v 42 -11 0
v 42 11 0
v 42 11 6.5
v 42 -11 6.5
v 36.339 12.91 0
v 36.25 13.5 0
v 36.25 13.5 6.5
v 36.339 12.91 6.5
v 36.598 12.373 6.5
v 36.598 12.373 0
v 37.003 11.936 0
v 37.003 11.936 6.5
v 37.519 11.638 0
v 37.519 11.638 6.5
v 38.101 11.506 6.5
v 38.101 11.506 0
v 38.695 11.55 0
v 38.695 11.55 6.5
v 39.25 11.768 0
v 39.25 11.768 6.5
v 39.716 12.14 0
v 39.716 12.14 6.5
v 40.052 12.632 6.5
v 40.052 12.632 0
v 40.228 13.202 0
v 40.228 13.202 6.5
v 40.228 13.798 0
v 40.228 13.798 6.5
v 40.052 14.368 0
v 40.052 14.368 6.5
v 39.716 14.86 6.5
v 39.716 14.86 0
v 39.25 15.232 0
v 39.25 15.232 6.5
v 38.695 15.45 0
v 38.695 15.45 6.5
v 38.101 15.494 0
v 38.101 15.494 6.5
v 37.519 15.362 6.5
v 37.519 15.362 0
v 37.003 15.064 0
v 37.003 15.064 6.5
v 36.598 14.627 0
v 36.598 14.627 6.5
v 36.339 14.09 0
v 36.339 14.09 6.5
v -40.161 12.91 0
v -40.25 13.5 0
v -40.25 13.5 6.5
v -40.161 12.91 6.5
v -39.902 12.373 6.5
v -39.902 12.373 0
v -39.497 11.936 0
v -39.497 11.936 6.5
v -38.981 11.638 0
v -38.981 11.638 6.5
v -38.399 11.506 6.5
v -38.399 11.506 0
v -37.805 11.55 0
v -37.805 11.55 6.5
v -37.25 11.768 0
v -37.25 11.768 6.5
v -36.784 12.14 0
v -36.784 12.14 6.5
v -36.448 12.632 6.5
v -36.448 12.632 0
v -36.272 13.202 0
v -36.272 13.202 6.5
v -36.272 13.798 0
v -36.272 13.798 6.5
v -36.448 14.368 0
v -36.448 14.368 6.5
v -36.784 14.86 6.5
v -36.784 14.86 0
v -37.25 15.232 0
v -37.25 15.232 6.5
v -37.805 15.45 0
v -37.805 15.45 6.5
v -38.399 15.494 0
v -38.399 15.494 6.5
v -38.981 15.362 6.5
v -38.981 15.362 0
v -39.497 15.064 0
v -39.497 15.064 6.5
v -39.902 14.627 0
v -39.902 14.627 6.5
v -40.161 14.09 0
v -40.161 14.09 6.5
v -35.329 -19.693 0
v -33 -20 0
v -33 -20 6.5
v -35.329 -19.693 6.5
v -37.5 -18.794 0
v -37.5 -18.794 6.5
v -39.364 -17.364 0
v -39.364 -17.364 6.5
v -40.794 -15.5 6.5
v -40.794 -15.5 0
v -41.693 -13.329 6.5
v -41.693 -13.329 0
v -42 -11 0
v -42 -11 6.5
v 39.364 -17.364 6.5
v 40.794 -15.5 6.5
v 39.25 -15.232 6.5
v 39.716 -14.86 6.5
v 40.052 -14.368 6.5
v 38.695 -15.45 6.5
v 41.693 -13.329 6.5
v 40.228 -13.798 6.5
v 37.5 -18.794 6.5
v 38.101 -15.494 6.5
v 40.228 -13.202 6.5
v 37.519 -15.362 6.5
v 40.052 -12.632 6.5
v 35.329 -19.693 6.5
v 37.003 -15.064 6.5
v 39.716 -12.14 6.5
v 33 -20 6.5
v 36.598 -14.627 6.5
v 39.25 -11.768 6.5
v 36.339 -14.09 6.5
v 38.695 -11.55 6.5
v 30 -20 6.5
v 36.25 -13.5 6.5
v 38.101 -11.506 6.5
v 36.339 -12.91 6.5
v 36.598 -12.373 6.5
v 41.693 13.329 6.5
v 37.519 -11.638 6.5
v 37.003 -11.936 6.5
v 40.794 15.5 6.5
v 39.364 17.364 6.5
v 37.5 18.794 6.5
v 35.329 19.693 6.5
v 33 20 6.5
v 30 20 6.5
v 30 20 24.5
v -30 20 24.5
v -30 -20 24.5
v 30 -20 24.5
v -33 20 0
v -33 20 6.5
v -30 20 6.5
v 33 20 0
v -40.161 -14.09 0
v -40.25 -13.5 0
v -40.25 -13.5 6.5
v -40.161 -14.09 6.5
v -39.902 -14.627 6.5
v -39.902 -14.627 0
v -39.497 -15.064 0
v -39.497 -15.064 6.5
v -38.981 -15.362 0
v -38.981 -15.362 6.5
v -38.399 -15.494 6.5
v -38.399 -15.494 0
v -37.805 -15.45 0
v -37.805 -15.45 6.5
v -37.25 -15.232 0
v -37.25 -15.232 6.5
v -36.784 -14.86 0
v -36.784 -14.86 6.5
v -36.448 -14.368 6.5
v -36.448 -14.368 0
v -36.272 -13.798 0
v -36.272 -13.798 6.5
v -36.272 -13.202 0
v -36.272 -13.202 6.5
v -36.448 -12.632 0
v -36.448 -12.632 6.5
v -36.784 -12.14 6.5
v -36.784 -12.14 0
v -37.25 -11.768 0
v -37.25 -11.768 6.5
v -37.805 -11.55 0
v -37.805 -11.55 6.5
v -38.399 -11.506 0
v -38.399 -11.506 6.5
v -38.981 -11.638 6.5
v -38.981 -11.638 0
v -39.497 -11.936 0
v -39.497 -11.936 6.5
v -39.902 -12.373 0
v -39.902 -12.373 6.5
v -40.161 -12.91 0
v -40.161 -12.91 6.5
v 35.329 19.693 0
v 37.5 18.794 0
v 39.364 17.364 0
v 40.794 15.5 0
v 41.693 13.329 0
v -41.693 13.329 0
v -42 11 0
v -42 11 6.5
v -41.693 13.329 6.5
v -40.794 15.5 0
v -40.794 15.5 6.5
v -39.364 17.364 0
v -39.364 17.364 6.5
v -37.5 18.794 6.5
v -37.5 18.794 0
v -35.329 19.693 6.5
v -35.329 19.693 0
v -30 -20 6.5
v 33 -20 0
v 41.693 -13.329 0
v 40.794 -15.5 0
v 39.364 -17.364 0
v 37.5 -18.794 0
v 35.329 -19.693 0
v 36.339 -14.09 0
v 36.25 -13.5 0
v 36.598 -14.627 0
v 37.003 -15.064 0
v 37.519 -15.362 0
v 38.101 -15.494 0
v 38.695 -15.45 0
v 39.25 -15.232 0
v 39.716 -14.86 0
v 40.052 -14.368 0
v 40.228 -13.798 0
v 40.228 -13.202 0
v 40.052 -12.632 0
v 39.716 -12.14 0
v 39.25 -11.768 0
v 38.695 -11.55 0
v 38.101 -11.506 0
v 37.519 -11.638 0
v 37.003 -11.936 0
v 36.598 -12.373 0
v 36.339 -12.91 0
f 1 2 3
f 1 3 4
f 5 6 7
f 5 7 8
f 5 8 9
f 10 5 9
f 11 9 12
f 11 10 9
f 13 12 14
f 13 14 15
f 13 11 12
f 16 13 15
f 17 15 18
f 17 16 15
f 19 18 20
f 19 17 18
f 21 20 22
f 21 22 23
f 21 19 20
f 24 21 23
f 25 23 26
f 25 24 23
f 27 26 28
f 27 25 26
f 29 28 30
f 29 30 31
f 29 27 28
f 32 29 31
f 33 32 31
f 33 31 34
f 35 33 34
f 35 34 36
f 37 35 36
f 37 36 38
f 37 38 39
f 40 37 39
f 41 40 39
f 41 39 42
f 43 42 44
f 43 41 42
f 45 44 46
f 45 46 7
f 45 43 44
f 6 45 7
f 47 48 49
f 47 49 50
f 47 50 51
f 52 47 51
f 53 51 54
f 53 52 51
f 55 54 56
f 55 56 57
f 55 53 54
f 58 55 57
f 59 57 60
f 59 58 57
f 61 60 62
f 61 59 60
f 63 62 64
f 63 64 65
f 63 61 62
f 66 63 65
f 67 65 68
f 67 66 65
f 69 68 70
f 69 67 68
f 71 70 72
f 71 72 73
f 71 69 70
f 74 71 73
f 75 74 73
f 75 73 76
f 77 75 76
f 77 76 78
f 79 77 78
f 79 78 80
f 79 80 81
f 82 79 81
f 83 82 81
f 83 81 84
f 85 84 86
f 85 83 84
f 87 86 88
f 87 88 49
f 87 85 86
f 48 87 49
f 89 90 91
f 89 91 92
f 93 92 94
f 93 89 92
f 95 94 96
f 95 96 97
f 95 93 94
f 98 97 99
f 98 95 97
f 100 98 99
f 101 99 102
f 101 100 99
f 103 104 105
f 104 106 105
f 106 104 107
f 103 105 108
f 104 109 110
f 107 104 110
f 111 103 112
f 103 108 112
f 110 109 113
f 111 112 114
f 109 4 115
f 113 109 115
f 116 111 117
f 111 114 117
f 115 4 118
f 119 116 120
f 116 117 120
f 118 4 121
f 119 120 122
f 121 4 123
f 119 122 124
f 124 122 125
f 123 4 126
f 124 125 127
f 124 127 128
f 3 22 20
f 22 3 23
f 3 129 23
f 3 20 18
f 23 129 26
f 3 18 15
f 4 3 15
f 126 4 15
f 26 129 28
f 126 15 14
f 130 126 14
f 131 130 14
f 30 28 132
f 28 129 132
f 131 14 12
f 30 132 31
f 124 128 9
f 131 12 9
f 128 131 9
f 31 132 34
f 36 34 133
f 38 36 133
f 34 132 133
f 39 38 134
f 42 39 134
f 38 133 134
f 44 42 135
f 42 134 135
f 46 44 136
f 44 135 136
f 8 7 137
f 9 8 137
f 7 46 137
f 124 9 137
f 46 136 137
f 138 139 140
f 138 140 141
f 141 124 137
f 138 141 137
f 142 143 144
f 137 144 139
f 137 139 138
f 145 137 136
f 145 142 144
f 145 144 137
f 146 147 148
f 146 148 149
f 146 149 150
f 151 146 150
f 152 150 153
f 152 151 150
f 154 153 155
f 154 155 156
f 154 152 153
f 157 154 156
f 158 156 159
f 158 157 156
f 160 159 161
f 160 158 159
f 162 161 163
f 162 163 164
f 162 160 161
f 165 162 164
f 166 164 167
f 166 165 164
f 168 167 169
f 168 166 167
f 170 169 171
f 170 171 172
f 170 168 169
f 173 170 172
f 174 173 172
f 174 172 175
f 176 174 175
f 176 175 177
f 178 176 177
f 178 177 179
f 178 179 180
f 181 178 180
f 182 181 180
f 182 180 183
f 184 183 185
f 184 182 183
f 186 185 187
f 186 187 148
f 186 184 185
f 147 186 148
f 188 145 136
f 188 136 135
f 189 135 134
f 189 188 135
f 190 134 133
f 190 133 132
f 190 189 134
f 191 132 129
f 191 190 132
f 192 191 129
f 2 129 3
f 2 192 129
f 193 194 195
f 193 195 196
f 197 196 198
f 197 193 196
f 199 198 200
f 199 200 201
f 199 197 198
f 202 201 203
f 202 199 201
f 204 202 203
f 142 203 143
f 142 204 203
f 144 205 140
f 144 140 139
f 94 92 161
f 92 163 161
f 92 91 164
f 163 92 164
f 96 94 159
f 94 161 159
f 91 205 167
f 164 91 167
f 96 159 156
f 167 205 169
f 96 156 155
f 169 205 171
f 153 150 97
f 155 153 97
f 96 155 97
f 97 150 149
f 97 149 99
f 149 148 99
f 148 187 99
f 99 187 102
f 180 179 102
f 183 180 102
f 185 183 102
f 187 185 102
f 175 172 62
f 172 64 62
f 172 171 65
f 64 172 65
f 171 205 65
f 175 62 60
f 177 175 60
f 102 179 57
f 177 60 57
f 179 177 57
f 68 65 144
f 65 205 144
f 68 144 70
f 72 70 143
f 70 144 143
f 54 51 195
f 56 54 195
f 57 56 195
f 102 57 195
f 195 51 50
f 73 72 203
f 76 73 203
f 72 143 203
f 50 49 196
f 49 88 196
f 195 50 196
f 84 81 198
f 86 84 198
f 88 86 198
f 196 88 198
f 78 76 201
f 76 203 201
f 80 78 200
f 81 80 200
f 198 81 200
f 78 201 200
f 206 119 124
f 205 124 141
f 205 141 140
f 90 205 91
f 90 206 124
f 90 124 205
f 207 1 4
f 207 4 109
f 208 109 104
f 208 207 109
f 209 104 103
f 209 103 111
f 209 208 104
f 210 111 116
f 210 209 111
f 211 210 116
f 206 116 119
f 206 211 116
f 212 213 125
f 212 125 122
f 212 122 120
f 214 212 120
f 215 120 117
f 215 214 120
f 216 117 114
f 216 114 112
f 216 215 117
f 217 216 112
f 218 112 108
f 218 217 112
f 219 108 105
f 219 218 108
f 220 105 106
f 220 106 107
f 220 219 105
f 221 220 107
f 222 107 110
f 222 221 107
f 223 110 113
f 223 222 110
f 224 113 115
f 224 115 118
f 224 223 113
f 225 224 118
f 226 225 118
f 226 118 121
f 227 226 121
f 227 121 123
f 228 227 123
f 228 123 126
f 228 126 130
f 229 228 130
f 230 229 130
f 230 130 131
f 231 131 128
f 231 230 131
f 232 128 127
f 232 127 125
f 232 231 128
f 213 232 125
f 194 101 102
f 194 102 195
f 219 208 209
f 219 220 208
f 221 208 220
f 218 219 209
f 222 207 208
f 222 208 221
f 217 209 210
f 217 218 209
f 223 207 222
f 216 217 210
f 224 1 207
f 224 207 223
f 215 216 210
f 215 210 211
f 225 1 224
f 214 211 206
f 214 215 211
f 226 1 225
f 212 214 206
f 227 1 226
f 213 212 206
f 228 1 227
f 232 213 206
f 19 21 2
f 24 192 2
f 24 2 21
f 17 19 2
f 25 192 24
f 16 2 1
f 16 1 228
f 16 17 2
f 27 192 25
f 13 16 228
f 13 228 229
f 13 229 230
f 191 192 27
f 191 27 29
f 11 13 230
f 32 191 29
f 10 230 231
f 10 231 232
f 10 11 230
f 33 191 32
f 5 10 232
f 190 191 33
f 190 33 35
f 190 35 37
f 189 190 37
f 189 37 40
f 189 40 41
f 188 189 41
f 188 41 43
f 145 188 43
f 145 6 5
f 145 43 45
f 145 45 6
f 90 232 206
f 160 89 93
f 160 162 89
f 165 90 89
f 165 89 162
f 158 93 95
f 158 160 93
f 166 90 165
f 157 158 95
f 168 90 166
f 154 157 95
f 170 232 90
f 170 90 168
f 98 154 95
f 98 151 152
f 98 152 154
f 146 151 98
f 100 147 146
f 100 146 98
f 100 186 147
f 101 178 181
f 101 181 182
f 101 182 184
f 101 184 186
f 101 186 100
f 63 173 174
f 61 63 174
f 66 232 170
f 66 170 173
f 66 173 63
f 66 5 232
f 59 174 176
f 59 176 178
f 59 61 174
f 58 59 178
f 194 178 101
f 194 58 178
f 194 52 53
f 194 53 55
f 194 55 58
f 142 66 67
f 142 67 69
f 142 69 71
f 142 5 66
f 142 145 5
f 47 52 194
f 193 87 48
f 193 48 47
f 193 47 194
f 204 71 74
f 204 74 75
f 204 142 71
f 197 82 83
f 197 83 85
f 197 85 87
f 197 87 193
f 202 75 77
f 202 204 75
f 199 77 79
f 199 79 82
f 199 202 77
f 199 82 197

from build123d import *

# Parameters (mm, degrees)
SKETCH_1_R      = 2
EXTRUDE_1_DEPTH = 6.5
SKETCH_2_W      = 60
SKETCH_2_H      = 40
EXTRUDE_2_DEPTH = 18


with BuildPart() as part:
    # ｽｹｯﾁ1 → ﾎﾞｽ - 押し出し1 (new body)
    with BuildSketch(Plane.XY):
        with BuildLine():
            Line((33, -20), (-33, -20))
            ThreePointArc((-33, -20), (-39.363961031, -17.363961031), (-42, -11))
            Line((-42, -11), (-42, 11))
            ThreePointArc((-42, 11), (-39.363961031, 17.363961031), (-33, 20))
            Line((-33, 20), (33, 20))
            ThreePointArc((33, 20), (39.363961031, 17.363961031), (42, 11))
            Line((42, 11), (42, -11))
            ThreePointArc((42, -11), (39.363961031, -17.363961031), (33, -20))
        make_face()
        with Locations(Location((-38.25, 13.5, 0), (0, 0, 180))):
            Circle(SKETCH_1_R, mode=Mode.SUBTRACT)
        with Locations(Location((38.25, 13.5, 0), (0, 0, 180))):
            Circle(SKETCH_1_R, mode=Mode.SUBTRACT)
        with Locations(Location((38.25, -13.5, 0), (0, 0, 180))):
            Circle(SKETCH_1_R, mode=Mode.SUBTRACT)
        with Locations(Location((-38.25, -13.5, 0), (0, 0, 180))):
            Circle(SKETCH_1_R, mode=Mode.SUBTRACT)
    extrude(amount=EXTRUDE_1_DEPTH)

    # ｽｹｯﾁ2 → ﾎﾞｽ - 押し出し2 (add)
    with BuildSketch(Plane.XY.offset(6.5)):
        Rectangle(SKETCH_2_W, SKETCH_2_H)
    extrude(amount=EXTRUDE_2_DEPTH)


solid = part.part
